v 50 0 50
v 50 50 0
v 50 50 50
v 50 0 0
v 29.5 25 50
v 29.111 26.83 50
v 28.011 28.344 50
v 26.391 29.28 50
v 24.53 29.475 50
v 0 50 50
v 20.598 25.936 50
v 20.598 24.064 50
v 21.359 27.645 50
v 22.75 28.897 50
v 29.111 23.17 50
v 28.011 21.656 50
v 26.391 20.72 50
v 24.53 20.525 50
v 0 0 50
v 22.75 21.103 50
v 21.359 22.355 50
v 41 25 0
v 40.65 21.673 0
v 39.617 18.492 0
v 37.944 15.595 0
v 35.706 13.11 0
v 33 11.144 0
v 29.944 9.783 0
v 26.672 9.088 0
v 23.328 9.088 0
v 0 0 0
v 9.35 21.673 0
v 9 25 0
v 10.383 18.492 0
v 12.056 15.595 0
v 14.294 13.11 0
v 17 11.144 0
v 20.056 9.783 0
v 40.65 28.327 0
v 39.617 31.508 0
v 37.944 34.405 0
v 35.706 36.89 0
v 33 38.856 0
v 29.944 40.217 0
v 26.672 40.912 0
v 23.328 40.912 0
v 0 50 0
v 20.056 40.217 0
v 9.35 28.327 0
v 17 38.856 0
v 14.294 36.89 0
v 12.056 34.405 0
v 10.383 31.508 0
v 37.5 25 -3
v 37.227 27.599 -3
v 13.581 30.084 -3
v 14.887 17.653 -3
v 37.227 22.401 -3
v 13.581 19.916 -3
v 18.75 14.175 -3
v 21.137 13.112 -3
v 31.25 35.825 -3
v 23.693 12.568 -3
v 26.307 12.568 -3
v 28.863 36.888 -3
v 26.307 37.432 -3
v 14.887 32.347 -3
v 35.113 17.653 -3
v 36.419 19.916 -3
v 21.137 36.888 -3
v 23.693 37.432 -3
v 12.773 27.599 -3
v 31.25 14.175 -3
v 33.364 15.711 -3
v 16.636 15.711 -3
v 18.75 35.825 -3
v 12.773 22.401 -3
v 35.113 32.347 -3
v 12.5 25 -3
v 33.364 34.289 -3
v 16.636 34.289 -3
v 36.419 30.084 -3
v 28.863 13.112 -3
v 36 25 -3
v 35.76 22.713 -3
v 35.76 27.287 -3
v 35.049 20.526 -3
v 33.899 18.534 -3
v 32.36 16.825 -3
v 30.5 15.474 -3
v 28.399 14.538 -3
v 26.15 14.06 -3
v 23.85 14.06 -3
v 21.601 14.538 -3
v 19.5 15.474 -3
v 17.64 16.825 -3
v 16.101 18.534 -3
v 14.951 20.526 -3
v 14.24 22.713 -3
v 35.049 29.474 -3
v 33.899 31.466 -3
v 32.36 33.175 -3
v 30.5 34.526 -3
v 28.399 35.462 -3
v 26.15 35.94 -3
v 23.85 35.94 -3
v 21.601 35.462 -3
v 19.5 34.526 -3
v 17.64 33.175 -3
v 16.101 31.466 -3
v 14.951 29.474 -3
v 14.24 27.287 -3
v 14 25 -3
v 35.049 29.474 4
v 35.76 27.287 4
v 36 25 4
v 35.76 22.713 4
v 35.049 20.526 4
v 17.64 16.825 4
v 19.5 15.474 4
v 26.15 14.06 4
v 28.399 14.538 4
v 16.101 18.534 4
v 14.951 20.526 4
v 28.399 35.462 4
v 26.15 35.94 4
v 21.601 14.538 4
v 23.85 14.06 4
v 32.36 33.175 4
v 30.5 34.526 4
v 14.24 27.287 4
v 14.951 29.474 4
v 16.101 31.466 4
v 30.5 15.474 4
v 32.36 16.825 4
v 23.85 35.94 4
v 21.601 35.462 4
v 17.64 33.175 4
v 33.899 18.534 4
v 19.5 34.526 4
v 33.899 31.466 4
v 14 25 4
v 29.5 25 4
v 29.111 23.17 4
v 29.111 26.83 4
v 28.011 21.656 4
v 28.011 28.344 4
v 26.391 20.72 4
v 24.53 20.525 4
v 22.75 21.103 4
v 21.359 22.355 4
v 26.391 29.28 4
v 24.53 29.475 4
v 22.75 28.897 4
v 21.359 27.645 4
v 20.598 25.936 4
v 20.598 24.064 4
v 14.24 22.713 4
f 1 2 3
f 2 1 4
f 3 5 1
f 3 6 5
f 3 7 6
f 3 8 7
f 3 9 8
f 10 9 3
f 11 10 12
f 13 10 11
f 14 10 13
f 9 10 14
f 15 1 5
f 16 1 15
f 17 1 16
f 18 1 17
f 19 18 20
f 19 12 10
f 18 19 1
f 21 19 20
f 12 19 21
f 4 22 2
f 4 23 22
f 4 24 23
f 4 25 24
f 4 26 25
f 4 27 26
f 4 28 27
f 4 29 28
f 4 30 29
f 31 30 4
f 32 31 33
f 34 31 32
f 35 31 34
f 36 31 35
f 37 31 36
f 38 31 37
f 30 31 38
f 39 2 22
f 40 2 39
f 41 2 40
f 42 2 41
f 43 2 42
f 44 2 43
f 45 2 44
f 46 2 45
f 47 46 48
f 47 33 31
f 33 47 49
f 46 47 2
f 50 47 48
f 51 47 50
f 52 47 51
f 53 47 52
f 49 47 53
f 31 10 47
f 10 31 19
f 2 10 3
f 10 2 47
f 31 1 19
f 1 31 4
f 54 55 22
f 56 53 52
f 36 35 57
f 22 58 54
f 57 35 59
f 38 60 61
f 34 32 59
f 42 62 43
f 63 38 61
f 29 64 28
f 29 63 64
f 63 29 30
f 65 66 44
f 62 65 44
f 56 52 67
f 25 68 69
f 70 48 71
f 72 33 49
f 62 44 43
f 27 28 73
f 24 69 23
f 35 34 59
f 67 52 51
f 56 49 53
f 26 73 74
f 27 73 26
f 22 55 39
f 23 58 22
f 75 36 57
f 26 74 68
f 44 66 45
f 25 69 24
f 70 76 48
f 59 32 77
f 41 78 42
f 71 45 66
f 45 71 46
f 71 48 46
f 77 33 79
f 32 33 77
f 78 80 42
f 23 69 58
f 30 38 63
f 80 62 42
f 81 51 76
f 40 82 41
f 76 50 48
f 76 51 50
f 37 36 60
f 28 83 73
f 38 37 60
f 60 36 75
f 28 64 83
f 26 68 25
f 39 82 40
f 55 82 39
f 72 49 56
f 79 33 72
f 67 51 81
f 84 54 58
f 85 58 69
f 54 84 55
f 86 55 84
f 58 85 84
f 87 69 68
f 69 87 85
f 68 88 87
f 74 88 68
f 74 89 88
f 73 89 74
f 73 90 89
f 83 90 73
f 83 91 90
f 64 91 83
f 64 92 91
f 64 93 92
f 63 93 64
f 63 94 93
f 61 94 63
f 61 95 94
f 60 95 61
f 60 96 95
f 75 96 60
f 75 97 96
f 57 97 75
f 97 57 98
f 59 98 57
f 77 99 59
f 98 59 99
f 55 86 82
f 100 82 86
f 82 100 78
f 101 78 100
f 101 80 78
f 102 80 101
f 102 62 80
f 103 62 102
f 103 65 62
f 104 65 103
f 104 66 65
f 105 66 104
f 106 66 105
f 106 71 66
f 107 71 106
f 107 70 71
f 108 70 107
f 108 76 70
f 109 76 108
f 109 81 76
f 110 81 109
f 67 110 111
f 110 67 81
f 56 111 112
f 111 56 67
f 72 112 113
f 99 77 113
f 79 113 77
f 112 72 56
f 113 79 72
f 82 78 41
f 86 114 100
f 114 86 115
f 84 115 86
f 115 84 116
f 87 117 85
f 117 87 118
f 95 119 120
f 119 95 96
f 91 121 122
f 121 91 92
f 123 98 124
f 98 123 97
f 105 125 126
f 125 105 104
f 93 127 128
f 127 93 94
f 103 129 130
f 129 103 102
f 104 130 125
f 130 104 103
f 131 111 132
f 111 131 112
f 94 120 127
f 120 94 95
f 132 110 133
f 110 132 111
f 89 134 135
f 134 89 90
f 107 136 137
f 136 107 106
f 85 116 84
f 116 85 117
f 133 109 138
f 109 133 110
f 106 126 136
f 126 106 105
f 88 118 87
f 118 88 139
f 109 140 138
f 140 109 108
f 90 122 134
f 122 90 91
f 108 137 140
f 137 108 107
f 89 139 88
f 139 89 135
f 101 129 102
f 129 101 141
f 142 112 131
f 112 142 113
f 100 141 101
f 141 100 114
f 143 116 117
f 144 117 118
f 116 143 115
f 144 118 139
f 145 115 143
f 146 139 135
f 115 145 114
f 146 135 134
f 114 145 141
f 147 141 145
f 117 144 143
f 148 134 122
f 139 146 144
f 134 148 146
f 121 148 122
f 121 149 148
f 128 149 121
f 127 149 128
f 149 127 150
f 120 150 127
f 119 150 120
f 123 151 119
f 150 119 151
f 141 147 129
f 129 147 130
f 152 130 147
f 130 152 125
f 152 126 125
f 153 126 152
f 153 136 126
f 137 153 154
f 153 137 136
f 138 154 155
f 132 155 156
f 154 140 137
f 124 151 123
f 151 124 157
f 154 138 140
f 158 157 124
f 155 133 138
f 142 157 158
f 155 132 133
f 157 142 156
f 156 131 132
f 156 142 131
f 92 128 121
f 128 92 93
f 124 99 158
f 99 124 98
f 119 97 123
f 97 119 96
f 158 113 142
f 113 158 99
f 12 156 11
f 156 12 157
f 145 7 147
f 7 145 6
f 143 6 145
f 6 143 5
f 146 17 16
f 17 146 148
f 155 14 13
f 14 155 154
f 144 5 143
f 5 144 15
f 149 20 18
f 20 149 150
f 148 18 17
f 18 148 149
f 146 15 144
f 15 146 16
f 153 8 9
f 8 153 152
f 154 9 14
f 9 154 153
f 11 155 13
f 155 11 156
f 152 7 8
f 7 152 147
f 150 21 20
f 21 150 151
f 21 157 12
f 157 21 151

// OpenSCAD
module 608Mount(throughDepth, heightOffSurface, wallThickness, transVec, rotVec) {
	difference() {
		union() {
			children();
			translate(transVec)
				rotate(rotVec)
					translate([0,0,-heightOffSurface])
						cylinder(d2=22+wallThickness+7,d1=22+wallThickness, h=heightOffSurface);
		}
		translate(transVec)
			rotate(rotVec) {
				translate([0,0,-heightOffSurface-.5])
					cylinder(d=22, h=7+.5);
				cylinder(d=9, h=throughDepth+1);
			}
	}
}

608Mount(50.5, 3, 3, [25, 25, 0], [0,0,0])
	cube(size=50);
